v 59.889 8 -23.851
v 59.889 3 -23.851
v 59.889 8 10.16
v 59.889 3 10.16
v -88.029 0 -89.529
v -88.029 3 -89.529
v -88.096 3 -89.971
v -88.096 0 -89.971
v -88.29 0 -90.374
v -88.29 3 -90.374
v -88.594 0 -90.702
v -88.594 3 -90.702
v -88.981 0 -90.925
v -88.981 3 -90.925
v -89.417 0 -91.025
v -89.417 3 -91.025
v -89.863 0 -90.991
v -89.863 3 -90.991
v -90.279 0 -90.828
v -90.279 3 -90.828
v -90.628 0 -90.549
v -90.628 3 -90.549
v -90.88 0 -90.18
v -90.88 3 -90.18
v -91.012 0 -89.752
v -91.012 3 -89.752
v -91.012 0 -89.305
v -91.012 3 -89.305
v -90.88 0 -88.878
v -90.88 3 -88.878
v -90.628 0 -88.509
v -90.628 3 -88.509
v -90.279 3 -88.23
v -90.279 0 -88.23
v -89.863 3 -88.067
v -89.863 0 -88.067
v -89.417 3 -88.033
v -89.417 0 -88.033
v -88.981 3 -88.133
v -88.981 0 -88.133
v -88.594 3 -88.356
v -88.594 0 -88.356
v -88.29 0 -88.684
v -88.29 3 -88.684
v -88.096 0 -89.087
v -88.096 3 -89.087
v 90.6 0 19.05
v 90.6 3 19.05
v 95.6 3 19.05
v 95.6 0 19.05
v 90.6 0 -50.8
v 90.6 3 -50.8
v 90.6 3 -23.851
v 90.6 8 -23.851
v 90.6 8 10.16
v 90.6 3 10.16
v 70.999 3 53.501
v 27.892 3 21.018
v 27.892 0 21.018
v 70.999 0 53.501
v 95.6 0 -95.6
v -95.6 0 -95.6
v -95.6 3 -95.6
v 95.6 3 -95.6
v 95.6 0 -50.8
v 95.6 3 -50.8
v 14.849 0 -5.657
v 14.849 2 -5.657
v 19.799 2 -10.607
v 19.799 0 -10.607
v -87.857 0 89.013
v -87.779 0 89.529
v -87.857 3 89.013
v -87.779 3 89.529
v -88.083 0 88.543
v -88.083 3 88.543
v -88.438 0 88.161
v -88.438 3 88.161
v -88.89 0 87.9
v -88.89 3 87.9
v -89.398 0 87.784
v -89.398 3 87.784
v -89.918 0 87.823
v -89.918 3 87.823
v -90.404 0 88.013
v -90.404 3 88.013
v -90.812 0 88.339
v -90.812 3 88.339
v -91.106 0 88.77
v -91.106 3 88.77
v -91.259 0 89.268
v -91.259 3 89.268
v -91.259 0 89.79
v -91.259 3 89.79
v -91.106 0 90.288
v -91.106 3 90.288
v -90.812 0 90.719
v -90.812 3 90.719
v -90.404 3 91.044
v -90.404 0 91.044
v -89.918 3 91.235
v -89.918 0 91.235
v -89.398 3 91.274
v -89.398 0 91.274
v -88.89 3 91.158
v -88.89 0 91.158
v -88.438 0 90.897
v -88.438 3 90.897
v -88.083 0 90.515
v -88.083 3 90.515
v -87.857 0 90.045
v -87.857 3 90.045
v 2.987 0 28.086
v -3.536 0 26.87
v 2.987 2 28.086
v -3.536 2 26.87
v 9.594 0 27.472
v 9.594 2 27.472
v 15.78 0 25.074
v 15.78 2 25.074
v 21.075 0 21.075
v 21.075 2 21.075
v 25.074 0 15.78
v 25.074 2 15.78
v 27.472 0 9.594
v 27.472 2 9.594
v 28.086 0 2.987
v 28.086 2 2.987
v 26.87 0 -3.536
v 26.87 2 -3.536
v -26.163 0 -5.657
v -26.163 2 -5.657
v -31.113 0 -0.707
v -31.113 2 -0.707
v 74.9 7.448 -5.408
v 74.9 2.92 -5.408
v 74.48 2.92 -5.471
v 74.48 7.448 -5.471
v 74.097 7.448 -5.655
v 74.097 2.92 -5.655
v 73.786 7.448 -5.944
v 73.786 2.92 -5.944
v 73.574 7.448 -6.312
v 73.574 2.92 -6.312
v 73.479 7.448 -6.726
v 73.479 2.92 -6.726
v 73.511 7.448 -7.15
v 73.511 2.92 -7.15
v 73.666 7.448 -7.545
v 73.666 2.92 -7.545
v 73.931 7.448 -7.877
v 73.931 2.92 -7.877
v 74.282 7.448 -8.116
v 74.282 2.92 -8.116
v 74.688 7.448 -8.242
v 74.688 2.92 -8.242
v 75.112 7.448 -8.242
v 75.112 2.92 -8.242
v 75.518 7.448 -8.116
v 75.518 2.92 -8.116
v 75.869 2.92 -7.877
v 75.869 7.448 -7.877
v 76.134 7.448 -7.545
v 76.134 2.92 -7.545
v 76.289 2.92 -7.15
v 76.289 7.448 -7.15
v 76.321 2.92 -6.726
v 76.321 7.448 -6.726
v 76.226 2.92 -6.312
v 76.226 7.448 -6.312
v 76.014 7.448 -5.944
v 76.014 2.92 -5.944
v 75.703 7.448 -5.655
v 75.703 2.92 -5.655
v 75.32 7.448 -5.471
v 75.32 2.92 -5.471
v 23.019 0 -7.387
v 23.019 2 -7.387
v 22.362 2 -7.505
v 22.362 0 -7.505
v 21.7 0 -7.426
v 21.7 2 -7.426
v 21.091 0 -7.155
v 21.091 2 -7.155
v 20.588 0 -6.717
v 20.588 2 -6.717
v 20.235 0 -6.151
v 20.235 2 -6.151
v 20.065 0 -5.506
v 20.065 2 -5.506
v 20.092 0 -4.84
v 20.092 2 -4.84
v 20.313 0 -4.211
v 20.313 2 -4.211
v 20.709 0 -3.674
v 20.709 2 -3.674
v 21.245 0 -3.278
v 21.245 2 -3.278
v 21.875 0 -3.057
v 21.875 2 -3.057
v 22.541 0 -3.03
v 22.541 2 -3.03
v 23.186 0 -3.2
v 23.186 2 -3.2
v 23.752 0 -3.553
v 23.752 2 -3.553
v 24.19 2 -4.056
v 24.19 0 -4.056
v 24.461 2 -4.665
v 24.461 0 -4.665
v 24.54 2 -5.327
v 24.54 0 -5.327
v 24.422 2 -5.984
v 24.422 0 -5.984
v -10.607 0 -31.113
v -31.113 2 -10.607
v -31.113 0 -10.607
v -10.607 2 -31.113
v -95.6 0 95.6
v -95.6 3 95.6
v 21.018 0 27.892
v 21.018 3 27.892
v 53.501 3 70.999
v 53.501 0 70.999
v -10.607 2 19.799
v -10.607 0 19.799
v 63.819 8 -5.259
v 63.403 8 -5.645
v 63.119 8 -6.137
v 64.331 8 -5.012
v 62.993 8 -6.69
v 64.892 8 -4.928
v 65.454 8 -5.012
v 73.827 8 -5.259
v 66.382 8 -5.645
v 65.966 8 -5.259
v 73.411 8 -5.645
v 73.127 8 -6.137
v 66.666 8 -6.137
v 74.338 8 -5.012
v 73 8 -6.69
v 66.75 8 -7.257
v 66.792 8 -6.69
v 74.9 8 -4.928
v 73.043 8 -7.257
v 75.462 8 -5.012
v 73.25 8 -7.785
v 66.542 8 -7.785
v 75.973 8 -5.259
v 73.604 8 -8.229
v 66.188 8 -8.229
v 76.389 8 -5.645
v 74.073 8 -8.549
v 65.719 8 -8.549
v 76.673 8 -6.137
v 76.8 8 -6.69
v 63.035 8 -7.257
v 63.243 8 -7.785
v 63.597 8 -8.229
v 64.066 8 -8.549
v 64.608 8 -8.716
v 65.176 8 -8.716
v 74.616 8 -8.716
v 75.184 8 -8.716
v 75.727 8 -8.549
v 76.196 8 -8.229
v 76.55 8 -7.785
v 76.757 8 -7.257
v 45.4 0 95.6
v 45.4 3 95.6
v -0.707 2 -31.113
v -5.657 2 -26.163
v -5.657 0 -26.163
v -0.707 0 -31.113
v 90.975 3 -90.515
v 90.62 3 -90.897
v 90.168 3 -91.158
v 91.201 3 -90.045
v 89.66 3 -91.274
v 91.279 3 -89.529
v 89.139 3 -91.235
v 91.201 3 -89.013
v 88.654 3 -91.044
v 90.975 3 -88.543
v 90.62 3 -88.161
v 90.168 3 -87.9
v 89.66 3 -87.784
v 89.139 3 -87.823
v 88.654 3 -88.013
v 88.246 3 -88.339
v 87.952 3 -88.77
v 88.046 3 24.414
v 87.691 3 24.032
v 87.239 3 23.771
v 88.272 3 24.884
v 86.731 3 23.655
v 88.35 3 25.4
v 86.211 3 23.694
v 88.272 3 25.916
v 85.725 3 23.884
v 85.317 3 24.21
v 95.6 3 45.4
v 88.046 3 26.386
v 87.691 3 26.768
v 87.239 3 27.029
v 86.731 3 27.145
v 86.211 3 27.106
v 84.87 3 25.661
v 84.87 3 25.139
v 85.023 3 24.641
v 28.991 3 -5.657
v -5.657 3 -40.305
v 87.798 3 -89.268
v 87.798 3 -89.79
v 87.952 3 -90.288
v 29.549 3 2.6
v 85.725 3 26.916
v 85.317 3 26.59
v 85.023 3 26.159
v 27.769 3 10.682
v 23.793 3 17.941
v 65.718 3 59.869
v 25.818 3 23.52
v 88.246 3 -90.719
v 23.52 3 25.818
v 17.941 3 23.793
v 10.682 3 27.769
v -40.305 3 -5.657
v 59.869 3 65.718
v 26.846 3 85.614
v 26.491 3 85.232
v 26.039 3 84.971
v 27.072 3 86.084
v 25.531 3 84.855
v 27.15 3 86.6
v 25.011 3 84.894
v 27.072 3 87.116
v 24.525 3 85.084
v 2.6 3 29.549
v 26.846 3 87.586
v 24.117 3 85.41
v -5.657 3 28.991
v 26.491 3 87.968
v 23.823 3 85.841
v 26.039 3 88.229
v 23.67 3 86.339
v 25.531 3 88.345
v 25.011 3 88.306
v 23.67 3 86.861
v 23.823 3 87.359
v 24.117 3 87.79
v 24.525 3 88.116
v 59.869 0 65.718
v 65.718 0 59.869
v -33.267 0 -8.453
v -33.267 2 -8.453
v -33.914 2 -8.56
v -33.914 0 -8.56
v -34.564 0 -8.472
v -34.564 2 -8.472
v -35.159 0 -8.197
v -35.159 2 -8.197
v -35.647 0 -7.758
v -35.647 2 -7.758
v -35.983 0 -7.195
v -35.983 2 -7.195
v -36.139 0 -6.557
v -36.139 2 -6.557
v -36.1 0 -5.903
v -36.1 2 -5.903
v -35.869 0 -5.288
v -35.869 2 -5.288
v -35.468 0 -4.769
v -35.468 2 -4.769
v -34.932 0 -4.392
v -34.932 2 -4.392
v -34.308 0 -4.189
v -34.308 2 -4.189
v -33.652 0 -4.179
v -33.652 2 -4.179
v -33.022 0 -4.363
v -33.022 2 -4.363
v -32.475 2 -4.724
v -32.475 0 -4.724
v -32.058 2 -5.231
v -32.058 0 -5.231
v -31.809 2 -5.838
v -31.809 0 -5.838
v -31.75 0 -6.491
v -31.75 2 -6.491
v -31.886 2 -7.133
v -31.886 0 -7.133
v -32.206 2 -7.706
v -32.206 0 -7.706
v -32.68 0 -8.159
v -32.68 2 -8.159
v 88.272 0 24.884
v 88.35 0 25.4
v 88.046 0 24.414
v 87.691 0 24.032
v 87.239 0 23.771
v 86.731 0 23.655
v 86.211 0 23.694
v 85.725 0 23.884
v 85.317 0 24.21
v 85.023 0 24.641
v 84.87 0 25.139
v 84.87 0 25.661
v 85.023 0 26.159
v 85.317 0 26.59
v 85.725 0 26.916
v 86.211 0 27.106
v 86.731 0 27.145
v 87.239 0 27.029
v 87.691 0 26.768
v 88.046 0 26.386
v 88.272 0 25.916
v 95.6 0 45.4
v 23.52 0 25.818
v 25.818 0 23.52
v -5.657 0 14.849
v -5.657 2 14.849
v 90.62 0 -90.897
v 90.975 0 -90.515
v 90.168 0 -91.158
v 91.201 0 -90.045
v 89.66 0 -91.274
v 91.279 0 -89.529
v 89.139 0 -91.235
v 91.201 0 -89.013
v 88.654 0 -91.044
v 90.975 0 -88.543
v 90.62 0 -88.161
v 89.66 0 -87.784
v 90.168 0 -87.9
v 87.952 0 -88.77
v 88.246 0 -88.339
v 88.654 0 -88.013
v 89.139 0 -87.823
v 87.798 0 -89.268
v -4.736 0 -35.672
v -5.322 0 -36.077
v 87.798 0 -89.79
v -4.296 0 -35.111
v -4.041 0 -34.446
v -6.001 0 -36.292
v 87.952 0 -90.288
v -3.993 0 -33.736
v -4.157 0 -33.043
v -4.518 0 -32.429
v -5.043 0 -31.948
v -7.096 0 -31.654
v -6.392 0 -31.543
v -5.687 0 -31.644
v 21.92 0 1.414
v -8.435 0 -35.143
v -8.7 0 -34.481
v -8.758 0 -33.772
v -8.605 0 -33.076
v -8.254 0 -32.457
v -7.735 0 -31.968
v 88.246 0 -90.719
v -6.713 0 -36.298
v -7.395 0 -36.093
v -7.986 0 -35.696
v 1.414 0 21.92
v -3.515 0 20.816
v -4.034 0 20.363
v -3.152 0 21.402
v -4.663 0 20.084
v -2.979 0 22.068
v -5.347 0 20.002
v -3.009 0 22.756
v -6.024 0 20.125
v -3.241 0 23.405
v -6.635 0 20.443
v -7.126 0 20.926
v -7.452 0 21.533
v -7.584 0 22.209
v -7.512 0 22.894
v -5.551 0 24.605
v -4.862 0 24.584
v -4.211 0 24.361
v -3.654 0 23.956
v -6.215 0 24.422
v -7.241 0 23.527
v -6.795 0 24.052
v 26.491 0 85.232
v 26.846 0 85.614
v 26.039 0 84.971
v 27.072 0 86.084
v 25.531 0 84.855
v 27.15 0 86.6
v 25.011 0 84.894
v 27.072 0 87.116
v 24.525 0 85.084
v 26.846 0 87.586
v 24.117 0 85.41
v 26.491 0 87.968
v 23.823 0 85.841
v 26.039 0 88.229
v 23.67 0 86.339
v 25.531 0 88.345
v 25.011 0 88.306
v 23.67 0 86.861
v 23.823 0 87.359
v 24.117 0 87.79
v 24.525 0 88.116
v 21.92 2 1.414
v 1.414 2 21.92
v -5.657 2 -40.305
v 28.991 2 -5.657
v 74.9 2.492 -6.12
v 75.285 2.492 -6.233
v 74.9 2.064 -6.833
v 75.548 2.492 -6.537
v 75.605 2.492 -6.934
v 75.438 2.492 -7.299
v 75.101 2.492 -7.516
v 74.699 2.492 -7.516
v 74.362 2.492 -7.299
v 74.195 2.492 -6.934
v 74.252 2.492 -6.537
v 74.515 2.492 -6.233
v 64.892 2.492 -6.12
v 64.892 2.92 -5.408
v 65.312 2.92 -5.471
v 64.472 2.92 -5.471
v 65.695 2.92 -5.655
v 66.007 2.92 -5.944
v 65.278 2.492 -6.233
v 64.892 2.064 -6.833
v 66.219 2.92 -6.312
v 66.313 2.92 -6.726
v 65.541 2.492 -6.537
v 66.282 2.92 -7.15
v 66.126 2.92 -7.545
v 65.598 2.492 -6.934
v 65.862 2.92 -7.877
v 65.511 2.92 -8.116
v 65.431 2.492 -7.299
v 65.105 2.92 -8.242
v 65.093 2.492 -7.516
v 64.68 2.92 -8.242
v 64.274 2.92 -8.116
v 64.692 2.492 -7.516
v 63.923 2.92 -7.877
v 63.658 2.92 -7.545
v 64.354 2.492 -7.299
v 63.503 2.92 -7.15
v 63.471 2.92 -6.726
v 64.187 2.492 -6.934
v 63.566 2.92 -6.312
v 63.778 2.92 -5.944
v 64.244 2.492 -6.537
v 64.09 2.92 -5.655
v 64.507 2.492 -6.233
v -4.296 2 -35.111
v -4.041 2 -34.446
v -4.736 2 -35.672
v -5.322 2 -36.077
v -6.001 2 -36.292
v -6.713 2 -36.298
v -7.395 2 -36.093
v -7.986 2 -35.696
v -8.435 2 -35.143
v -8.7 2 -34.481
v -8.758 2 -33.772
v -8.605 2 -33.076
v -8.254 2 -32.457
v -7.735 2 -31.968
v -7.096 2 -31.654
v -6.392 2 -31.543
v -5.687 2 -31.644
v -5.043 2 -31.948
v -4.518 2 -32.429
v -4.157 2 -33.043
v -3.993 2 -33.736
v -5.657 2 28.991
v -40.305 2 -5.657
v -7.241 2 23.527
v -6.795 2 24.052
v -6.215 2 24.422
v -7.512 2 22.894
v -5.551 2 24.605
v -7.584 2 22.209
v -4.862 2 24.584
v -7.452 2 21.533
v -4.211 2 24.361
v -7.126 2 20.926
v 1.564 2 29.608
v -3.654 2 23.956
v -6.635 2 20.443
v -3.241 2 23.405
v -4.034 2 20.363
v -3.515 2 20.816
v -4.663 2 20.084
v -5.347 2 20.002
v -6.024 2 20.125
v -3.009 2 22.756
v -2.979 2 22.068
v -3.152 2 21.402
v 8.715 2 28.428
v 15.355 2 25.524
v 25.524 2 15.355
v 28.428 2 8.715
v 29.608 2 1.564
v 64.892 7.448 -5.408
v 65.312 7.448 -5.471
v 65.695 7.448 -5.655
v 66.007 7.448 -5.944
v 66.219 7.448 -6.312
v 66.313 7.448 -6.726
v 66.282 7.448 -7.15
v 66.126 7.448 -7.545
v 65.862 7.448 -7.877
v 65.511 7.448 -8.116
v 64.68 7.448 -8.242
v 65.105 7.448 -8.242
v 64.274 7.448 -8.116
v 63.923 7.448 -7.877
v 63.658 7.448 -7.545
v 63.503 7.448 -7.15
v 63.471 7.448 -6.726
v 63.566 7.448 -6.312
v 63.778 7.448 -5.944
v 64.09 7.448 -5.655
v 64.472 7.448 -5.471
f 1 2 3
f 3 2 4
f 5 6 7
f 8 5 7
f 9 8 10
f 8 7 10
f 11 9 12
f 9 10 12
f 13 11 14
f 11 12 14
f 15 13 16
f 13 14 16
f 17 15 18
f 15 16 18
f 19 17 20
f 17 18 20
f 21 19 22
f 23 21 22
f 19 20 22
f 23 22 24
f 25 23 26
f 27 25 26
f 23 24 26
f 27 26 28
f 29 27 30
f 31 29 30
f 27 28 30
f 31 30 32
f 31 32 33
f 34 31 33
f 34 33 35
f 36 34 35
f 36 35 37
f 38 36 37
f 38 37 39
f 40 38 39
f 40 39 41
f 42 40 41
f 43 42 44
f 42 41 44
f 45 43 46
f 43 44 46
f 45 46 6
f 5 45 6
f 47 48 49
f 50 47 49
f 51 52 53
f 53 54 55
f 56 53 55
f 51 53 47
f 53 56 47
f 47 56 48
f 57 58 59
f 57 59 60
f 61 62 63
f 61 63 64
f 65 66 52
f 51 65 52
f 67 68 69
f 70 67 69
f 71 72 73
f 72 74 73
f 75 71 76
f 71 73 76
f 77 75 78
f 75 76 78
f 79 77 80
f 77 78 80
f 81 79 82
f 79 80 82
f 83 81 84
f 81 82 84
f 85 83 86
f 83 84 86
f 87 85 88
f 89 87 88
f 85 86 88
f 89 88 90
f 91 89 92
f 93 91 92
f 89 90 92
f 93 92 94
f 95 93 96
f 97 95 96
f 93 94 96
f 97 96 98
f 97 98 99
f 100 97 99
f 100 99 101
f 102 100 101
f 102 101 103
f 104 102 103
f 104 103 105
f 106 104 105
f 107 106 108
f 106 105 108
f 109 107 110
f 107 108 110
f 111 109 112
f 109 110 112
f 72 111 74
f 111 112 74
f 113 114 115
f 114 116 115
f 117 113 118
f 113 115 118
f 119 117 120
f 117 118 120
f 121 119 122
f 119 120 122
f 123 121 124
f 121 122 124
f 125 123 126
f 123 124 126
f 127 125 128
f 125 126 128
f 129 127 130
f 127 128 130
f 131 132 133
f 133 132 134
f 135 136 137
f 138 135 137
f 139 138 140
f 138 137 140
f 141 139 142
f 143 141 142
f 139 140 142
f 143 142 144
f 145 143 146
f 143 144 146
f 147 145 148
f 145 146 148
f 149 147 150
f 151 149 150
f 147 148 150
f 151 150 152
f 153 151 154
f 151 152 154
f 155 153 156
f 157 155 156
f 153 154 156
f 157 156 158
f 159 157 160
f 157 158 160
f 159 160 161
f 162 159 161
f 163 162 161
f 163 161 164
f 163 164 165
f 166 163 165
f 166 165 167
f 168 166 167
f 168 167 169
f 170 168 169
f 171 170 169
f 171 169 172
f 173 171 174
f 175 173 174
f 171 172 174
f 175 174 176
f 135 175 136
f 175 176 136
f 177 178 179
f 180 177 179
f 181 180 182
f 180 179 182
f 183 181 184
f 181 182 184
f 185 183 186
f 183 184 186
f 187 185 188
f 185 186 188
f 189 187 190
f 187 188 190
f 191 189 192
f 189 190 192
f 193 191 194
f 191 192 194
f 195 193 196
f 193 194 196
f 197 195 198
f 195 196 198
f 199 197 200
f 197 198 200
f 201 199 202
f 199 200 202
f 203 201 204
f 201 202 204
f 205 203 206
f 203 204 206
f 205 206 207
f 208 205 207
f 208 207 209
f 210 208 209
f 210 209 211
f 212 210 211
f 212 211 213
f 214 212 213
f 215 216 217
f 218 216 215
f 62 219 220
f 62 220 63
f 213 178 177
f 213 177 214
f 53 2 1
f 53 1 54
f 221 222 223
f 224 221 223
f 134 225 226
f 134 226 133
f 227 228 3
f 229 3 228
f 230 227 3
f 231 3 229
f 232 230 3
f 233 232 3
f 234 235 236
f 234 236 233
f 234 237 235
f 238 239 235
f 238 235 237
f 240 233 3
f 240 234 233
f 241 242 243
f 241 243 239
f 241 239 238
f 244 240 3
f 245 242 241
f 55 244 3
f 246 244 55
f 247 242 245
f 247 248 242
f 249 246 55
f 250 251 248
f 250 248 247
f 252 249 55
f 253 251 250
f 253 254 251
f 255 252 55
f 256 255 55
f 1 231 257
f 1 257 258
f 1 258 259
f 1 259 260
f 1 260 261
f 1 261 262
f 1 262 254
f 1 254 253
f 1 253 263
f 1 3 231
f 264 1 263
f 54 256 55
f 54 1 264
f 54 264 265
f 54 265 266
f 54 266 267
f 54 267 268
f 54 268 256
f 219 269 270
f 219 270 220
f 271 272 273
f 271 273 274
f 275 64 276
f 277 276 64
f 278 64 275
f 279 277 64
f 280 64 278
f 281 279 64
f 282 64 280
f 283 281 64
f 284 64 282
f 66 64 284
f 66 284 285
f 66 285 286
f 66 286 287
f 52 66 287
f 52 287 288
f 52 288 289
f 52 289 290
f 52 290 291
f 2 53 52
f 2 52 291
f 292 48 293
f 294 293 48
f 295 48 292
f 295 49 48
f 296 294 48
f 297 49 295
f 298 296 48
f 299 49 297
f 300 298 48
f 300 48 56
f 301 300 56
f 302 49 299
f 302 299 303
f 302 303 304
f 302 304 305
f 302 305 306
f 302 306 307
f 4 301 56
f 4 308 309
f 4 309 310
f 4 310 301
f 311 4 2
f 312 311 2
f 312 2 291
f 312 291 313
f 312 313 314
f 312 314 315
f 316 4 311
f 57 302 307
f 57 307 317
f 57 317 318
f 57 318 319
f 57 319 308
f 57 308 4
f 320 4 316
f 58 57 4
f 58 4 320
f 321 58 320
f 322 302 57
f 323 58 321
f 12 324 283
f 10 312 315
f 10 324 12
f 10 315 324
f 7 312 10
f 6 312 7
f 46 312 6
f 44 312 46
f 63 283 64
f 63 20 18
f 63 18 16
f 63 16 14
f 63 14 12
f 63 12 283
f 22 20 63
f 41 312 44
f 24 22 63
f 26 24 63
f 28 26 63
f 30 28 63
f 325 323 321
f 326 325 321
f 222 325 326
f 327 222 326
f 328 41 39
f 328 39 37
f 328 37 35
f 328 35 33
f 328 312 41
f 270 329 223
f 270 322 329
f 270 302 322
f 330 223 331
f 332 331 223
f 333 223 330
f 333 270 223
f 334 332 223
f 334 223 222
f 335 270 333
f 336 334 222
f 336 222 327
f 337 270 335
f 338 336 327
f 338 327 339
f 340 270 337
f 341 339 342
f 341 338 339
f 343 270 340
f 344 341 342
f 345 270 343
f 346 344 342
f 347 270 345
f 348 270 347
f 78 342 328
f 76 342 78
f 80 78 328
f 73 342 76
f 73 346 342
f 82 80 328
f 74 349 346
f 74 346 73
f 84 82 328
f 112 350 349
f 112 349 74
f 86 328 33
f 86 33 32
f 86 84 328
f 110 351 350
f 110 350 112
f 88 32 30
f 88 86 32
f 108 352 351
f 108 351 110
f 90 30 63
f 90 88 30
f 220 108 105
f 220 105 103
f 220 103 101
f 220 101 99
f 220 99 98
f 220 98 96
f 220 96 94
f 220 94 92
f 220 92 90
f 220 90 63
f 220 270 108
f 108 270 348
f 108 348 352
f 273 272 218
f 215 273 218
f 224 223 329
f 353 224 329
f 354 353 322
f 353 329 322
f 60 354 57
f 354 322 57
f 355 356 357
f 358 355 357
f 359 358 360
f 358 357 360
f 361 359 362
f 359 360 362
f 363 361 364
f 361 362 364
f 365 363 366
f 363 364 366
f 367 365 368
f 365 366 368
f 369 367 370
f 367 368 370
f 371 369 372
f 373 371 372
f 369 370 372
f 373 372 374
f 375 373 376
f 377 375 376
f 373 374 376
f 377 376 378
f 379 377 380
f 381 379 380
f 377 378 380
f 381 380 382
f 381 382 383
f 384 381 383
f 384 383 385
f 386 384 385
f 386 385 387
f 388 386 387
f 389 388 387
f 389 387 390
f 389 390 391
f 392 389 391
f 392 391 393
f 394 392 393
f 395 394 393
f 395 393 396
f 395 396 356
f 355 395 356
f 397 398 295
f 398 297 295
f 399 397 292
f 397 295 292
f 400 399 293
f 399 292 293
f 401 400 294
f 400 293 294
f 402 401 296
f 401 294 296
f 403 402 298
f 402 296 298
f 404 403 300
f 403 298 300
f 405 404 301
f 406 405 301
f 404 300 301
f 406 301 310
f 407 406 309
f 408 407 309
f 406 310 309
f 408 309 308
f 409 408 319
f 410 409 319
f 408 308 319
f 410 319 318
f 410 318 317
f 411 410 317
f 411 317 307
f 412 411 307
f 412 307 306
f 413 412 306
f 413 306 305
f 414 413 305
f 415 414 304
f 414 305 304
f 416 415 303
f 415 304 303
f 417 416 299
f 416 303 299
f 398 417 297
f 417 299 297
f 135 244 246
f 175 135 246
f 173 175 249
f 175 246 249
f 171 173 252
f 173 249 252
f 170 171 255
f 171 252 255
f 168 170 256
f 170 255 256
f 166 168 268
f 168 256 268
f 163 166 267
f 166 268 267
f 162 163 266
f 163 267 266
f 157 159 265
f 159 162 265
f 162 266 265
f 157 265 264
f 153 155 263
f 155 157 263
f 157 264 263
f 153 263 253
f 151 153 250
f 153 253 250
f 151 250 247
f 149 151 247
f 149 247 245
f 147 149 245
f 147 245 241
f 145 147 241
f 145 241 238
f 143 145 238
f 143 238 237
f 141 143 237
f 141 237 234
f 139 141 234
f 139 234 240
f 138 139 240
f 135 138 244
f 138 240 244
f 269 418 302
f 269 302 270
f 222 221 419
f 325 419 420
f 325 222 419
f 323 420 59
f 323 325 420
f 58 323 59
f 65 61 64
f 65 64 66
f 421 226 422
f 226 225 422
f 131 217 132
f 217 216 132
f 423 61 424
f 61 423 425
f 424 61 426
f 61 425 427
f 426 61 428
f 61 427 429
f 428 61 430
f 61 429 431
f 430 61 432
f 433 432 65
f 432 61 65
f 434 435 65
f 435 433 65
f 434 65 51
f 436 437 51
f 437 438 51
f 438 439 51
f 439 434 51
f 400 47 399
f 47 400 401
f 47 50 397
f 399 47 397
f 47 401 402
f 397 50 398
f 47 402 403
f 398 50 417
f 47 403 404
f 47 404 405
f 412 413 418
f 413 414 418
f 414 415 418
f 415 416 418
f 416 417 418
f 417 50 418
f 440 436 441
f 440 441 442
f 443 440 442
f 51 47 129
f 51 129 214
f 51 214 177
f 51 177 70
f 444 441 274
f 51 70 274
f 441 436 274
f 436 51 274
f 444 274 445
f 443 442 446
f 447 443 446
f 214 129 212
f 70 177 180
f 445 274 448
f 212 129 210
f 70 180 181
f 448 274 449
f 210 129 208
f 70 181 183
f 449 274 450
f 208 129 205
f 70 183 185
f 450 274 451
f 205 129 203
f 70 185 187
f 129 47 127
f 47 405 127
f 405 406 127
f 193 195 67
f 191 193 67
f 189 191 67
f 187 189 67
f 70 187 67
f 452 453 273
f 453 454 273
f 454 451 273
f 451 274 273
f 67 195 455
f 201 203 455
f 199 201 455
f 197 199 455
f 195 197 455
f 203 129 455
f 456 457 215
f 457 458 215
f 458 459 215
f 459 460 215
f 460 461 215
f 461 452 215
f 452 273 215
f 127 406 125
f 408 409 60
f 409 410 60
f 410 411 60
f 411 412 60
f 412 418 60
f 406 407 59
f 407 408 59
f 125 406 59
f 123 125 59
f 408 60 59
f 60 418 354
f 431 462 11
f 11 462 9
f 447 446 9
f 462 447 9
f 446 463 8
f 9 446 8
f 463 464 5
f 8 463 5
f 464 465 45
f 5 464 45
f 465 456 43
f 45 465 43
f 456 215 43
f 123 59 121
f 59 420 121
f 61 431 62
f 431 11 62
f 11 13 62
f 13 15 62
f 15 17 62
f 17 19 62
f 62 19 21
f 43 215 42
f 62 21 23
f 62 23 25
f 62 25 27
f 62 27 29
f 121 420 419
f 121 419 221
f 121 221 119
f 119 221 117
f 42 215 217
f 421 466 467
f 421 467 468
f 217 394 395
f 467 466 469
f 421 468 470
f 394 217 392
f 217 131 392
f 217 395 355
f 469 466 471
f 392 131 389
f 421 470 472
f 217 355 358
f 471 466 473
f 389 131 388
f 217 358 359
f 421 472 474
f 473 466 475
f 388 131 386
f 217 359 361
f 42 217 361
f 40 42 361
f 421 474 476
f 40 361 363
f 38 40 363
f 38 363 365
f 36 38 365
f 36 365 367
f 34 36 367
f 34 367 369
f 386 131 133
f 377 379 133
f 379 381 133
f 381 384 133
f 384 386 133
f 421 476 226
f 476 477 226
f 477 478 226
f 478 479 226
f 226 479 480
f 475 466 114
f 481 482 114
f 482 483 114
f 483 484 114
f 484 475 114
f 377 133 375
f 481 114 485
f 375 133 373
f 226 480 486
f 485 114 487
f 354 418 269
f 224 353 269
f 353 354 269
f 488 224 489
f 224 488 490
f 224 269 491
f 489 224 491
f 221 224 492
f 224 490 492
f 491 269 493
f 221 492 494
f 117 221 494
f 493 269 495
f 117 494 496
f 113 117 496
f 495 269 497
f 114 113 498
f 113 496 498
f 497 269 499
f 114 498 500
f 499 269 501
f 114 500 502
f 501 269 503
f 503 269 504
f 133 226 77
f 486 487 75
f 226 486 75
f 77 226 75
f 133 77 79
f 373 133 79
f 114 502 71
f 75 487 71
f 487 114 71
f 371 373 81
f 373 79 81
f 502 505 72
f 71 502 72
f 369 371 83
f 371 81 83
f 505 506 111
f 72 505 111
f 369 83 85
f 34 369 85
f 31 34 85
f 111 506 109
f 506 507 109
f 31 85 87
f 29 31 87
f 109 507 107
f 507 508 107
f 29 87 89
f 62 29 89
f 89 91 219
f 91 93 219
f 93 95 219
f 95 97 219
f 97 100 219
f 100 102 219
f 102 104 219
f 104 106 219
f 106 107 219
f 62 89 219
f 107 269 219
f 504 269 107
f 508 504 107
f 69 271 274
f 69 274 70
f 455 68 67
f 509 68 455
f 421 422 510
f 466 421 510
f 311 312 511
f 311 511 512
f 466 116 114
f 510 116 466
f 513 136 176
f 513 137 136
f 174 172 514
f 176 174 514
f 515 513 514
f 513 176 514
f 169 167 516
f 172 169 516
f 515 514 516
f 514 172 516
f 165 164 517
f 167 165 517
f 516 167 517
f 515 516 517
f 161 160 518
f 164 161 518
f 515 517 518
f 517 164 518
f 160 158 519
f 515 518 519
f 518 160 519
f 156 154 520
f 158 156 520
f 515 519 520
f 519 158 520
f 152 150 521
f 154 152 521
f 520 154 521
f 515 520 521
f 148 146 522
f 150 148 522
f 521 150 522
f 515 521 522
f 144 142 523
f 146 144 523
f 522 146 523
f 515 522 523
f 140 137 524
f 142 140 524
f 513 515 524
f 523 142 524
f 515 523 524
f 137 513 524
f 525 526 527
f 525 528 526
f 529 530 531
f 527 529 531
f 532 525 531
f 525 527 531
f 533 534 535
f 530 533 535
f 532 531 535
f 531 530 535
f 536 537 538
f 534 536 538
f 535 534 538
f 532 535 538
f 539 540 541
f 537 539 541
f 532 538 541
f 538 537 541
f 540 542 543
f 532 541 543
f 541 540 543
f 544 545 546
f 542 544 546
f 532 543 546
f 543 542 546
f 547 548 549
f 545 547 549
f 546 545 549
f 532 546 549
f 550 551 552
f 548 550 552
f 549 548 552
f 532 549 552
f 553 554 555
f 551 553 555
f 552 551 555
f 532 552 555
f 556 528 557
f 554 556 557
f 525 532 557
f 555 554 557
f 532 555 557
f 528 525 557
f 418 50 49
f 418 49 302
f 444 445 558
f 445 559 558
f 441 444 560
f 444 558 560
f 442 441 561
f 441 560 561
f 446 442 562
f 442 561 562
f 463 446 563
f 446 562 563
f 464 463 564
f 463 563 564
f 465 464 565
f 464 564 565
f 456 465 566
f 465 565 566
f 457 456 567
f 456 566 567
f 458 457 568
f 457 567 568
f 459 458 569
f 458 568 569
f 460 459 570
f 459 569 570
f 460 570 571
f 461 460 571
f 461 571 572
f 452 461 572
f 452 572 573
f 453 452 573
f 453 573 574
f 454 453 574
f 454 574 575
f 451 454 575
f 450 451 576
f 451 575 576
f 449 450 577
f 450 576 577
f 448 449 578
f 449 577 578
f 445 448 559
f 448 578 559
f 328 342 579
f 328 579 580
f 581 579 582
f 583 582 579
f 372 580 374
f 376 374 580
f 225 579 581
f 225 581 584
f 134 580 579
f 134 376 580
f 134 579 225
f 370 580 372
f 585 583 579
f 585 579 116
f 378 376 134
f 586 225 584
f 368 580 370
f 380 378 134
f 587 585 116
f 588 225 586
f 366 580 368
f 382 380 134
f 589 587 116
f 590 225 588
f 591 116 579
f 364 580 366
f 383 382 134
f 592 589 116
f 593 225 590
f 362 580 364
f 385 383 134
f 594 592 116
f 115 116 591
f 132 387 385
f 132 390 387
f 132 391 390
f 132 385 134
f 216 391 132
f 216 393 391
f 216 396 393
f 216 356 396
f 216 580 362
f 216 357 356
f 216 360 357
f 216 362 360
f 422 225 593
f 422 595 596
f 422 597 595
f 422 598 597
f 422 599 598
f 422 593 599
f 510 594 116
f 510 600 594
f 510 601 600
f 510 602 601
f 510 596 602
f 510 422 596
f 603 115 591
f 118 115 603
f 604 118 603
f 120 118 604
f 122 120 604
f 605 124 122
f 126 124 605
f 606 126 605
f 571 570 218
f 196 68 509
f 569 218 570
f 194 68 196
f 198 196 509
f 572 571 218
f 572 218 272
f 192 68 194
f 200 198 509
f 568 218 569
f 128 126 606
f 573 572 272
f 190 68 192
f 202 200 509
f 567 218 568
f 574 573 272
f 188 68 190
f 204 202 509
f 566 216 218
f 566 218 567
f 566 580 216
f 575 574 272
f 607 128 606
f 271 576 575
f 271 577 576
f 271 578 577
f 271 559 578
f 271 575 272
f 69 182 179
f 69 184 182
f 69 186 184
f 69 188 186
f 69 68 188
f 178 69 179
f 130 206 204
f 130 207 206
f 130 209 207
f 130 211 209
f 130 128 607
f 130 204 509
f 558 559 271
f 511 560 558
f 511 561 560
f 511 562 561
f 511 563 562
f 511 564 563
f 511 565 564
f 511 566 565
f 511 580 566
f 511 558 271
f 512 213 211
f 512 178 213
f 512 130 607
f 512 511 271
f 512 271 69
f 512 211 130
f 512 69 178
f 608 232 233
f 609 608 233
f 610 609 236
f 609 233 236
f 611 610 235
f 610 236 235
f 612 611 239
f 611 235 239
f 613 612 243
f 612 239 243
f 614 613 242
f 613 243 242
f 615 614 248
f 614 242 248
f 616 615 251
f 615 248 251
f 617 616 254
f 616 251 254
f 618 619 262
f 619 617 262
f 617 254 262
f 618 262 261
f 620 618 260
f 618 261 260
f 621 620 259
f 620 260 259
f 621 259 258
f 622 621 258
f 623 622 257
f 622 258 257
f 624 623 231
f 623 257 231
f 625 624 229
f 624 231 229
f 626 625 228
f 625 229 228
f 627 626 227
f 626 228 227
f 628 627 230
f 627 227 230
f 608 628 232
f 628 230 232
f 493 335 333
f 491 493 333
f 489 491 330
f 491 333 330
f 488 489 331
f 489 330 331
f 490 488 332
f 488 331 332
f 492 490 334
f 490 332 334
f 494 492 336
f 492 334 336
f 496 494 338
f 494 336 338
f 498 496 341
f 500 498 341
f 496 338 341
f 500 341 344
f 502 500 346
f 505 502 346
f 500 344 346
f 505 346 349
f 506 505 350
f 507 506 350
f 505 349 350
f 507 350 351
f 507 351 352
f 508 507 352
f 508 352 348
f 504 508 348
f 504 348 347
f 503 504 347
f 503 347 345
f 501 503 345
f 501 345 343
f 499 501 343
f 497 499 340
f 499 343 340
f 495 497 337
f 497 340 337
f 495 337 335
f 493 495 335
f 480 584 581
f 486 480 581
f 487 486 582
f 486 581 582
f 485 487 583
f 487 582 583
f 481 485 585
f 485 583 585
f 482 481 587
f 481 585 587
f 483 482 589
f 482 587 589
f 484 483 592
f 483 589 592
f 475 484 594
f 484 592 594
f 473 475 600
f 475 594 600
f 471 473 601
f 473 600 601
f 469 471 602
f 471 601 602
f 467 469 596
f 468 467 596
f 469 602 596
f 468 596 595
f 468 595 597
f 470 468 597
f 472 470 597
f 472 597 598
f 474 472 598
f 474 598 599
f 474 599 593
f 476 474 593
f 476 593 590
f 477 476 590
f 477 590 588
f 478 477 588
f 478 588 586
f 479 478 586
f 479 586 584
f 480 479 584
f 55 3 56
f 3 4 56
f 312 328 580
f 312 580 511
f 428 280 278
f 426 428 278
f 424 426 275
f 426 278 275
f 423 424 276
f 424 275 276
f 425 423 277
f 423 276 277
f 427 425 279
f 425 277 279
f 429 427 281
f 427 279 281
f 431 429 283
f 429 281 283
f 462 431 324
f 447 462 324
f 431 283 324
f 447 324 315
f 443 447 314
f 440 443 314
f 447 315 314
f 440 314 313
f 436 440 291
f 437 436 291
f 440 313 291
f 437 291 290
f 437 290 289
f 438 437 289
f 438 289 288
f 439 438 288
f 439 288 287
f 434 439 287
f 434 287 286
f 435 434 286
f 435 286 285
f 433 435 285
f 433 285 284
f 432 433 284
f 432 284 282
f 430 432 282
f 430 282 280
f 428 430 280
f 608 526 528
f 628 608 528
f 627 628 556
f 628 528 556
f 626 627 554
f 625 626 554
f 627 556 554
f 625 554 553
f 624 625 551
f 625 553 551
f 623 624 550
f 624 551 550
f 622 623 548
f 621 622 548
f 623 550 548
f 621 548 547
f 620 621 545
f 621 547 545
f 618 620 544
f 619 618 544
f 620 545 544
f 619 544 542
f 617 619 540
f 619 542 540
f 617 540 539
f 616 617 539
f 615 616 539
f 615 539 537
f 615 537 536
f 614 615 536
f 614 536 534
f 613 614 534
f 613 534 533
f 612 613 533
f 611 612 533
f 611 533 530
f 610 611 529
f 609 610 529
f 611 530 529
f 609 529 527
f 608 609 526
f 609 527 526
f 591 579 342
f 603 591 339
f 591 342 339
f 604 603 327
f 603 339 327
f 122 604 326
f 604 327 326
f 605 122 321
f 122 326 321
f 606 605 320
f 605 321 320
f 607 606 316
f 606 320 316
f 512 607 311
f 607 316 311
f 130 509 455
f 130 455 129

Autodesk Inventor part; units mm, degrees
ref_plane "YZ Plane" through (0, 0, 0) normal (1, 0, 0) x (0, 1, 0)
ref_plane "XZ Plane" through (0, 0, 0) normal (0, 1, 0) x (-1, 0, 0)
ref_plane "XY Plane" through (0, 0, 0) normal (0, 0, 1) x (1, 0, 0)
sketch "Sketch1" plane through (0, 0, 0) normal (0, 1, 0) x (-1, 0, 0)
  line L0 (101.6, -101.6) -> (-101.6, -101.6)
  line L1 (-101.6, -101.6) -> (-101.6, 101.6)
  line L2 (-101.6, 101.6) -> (101.6, 101.6)
  line L3 (101.6, 101.6) -> (101.6, -101.6)
  line L4 (96.6, -96.6) -> (-96.6, -96.6)
  line L5 (-96.6, -96.6) -> (-96.6, 96.6)
  line L6 (-96.6, 96.6) -> (96.6, 96.6)
  line L7 (96.6, 96.6) -> (96.6, -96.6)
  line L8 (101.6, 101.6) -> (-40.4, 101.6)
  circle A0 centre (0, 0) radius 88.9
  line L9 (-40.4, 101.6) -> (-101.6, 40.4)
  line L10 (-45.4, 101.6) -> (-101.6, 45.4)
  line L11 (96.6, 96.6) -> (96.6, 101.6)
  line L12 (-45.4, 101.6) -> (-35.4, 101.6)
  line L13 (-35.4, 101.6) -> (-35.4, 96.6)
  line L14 (-35.4, 96.6) -> (-45.4, 96.6)
  line L15 (-45.4, 96.6) -> (-45.4, 101.6)
  line L16 (-101.6, 39.4) -> (-39.4, 101.6)
  line L17 (95.6, -95.6) -> (-95.6, -95.6)
  line L18 (-95.6, -95.6) -> (-95.6, 95.6)
  line L19 (-95.6, 95.6) -> (95.6, 95.6)
  line L20 (95.6, 95.6) -> (95.6, -95.6)
  point P0 (96.6, 51.2168)
  point P1 (101.6, 40.4)
  point P2 (101.6, -40.4)
  point P3 (96.6, -51.2168)
  point P4 (-96.6, 45.4)
  point P5 (-45.4, 96.6)
  point P6 (-45.4, 95.6)
  point P7 (-95.6, 45.4)
  dimension "d0" = 203.2
  dimension "d1" = 203.2
  dimension "d2" = 101.6
  dimension "d3" = 101.6
  dimension "d4" = 5
  dimension "d5" = 5
  dimension "d6" = 5
  dimension "d7" = 5
  dimension "d8" = 142
  dimension "d9" = 61.2
  dimension "d10" = 177.8
  dimension "d11" = 5
  dimension "d12" = 5
  dimension "d13" = 10
  dimension "d14" = 1
  dimension "d15" = 1
  dimension "d16" = 1
  dimension "d17" = 1
  dimension "d18" = 1
extrude "Extrusion1" add sketch "Sketch1" along normal blind 3 contours L16 L19 L20 L17 L18 | A0
sketch "Sketch2" plane through (0, 3, 0) normal (0, 1, 0) x (1, 0, 0)
  circle A0 centre (0, 0) radius 34.925
  circle A1 centre (0, 0) radius 88.9
  line L0 (0, 0) -> (53.5014, -70.9987)
  line L1 (0, 0) -> (70.9987, -53.5014)
  line L2 (45.4, -95.6) -> (95.6, -45.4) projected
  line L3 (70.5, -70.5) -> (0, 0)
  point P0 (21.0184, -27.8923)
  point P1 (27.8923, -21.0184)
  dimension "d21" = 69.85
  dimension "d22" = 177.8
  dimension "d23" = 8
  dimension "d24" = 8
extrude "Extrusion2" cut sketch "Sketch2" against normal blind 5 contours A0 L3 A1 L0 | L1 A1 L3 A0
sketch "Sketch3" plane through (0, 3, 0) normal (0, 1, 0) x (1, 0, 0)
  circle A0 centre (0, 0) radius 2.5
  line L0 (11.3314, 2.139) -> (-2.139, -11.3314)
  line L1 (0, 0) -> (-5.6569, 5.6569)
  line L2 (-5.6569, -14.8492) -> (-26.163, 5.6569)
  line L3 (-5.6569, 26.163) -> (14.8492, 5.6569)
  circle A1 centre (-5.6569, 5.6569) radius 14
  line L4 (-26.163, 5.6569) -> (-5.6569, 26.163)
  line L5 (14.8492, 5.6569) -> (-5.6569, -14.8492)
  line L6 (-40.3051, 5.6569) -> (-5.6569, 40.3051)
  line L7 (-5.6569, 40.3051) -> (28.9914, 5.6569)
  line L8 (28.9914, 5.6569) -> (-5.6569, -28.9914)
  line L9 (-5.6569, -28.9914) -> (-40.3051, 5.6569)
  line L10 (-22.6451, 9.1747) -> (-9.1747, 22.6451)
  line L11 (-9.1747, 22.6451) -> (-12.7668, 26.2372)
  line L12 (-12.7668, 26.2372) -> (-26.2372, 12.7668)
  line L13 (-26.2372, 12.7668) -> (-22.6451, 9.1747)
  line L14 (-36.0624, 5.6569) -> (-5.6569, 36.0624)
  line L15 (-5.6569, 36.0624) -> (26.8701, 3.5355)
  line L16 (26.8701, 3.5355) -> (-3.5355, -26.8701)
  line L17 (-3.5355, -26.8701) -> (-36.0624, 5.6569)
  arc A2 (-5.6569, -28.9914) -> (28.9914, 5.6569) centre (0.4206, -0.4206) ccw
  dimension "d27" = 8
  dimension "d28" = 28
  dimension "d29" = 29
  dimension "d30" = 29
  dimension "d31" = 14.5
  dimension "d32" = 10
  dimension "d33" = 10
  dimension "d34" = 10
  dimension "d35" = 10
  dimension "d36" = 5.08
  dimension "d37" = 9.525
  dimension "d38" = 9.525
  dimension "d39" = 3
  dimension "d40" = 3
  dimension "d41" = 0
  dimension "d42" = 3
  dimension "d51" = 29.21
extrude "Extrusion3" cut sketch "Sketch3" against normal blind 1 contours A0 | L0 L5 L2 L4 L3 | L4 L13 L12 L11 | A1 | L6 L7 L8 L15 L14 L17 L9 | L8 A2 | L17 L14 L15 L8
sketch "Sketch4" plane through (0, 2, 0) normal (0, 1, 0) x (1, 0, 0)
  line L0 (-36.0624, 5.6569) -> (-5.6569, 36.0624)
  line L1 (-5.6569, 36.0624) -> (26.8701, 3.5355)
  line L2 (26.8701, 3.5355) -> (-3.5355, -26.8701)
  line L3 (-3.5355, -26.8701) -> (-36.0624, 5.6569)
  line L4 (-5.6569, 40.3051) -> (28.9914, 5.6569) projected
  line L5 (-40.3051, 5.6569) -> (-5.6569, 40.3051) projected
  line L6 (-5.6569, -28.9914) -> (-40.3051, 5.6569) projected
  line L7 (28.9914, 5.6569) -> (-5.6569, -28.9914) projected
  arc A0 (-3.5355, -26.8701) -> (26.8701, 3.5355) centre (4.0877, -4.0877) ccw
  point P0 (0, 0)
  dimension "d45" = 3
  dimension "d46" = 3
  dimension "d47" = 3
  dimension "d48" = 0
extrude "Extrusion4" cut sketch "Sketch4" against normal blind 5 contours L0 L1 L2 L3 | L2 A0
sketch "Sketch6" plane through (0, 3, 0) normal (0, 1, 0) x (1, 0, 0)
  line L0 (95.6, 95.6) -> (-95.6, 95.6) projected
  line L1 (95.6, 95.6) -> (90.6, 95.6)
  line L2 (90.6, 95.6) -> (90.6, -46.4)
  line L3 (90.6, -46.4) -> (95.6, -46.4)
  line L4 (95.6, -46.4) -> (95.6, 95.6)
  line L5 (95.6, -45.4) -> (95.6, 95.6) projected
  line L6 (90.6, -19.05) -> (95.6, -19.05)
  line L7 (95.6, -19.05) -> (95.6, 50.8)
  line L8 (95.6, 50.8) -> (90.6, 50.8)
  line L9 (90.6, 50.8) -> (90.6, -19.05)
  line L10 (0, 0) -> (95.6, 0)
  point P0 (95.6, -19.05)
  dimension "d58" = 5
  dimension "d59" = 142
  dimension "d62" = 50.8
  dimension "d63" = 19.05
extrude "Extrusion6" cut sketch "Sketch6" against normal blind 25.4 contours L4 L10 L2 L8 | L4 L6 L2 L10
sketch "Sketch7" plane through (0, 3, 0) normal (0, 1, 0) x (1, 0, 0)
  line L0 (-95.6, 95.6) -> (-95.6, -95.6) projected
  line L1 (-95.6, -95.6) -> (45.4, -95.6) projected
  line L2 (95.6, 50.8) -> (90.6, 50.8) projected
  line L3 (90.6, 50.8) -> (65.2, 50.8)
  line L4 (90.6, -19.05) -> (90.6, 50.8)
  line L5 (90.6, -19.05) -> (90.6, 50.8) projected
  line L6 (90.6, 50.8) -> (95.6, 50.8) projected
  line L7 (90.6, 50.8) -> (59.8886, 50.8)
  line L8 (59.8886, 50.8) -> (59.8886, -10.16)
  line L9 (59.8886, -10.16) -> (90.6, -10.16)
  line L10 (90.6, -10.16) -> (90.6, 50.8)
  line L11 (59.8886, 23.8506) -> (90.6, 23.8506)
  point P0 (0, 0)
  point P1 (62.2, 50.8)
  dimension "d72" = 60.96
  dimension "d90" = 34.0106
  dimension "d154" = 30.7114
extrude "Extrusion7" add sketch "Sketch7" along normal blind 5 contours L4 L9 L8 L11
sketch "Sketch8" plane through (0, 8, 0) normal (0, 1, 0) x (1, 0, 0)
  line L0 (59.8886, -10.16) -> (90.6, -10.16) projected
  line L1 (59.8886, -10.16) -> (90.6, -10.16)
  line L2 (90.6, -10.16) -> (90.6, 6.8326)
  line L3 (90.6, 50.8) -> (90.6, -19.05) projected
  line L4 (90.6, 6.8326) -> (65.2, 6.8326)
  circle A0 centre (74.9, 6.8326) radius 1.5
  circle A1 centre (64.8924, 6.8326) radius 1.5
  line L5 (59.8886, 23.8506) -> (59.8886, -10.16) projected
  point P0 (0, 0)
  dimension "d78" = 16.9926
  dimension "d79" = 3
  dimension "d80" = 3
  dimension "d139" = 5.0038
  dimension "d140" = 10.0076
  dimension "d153" = 15.7
hole "Hole1" at (74.9, 8, -6.8326) at (64.8924, 8, -6.8326) direction (0, -1, 0) diameter 2.85 depth 5.08 tip angle 118 countersink diameter 3.81 countersink angle 82 thread size "M3.5x0.6" class "6H" standard "ANSI Metric M Profile"
sketch "Sketch9" plane through (0, 2, 0) normal (0, 1, 0) x (1, 0, 0)
  point P0 (0, 0)
sketch "Sketch10" plane through (0, 2, 0) normal (0, 1, 0) x (1, 0, 0)
  circle A0 centre (6.7129, 18.0166) radius 2
  circle A1 centre (-18.0312, -6.7275) radius 2
  circle A2 centre (-18.0312, -6.7275) radius 2
  circle A3 centre (-5.6569, 5.6469) radius 14
  circle A4 centre (0, -0.01) radius 2.5
  circle A5 centre (22.2964, 5.2615) radius 2.2448
  circle A6 centre (-5.2761, -22.3111) radius 2.3104
  circle A7 centre (-33.9469, 6.3598) radius 2.2008
  circle A8 centre (-6.3744, 33.9323) radius 2.3894
  line L0 (-5.6569, 40.3051) -> (28.9914, 5.6569) projected
  line L1 (-5.6569, 40.3051) -> (1.4142, 33.234)
  line L2 (-5.6569, 26.163) -> (1.4142, 33.234)
  line L3 (-5.6569, 26.163) -> (-12.7279, 33.234)
  line L4 (-40.3051, 5.6569) -> (-5.6569, 40.3051) projected
  line L5 (-5.6569, 40.3051) -> (-40.3051, 5.6569)
  line L6 (-5.6569, 26.163) -> (-33.234, -1.4142)
  line L7 (-5.6569, -28.9914) -> (-40.3051, 5.6569) projected
  line L8 (-33.234, 12.7279) -> (-26.163, 5.6569)
  arc A9 (-5.6569, -28.9914) -> (21.0752, -21.0752) centre (0.4206, -0.4206) ccw projected
  line L9 (-5.6569, -28.9914) -> (28.9914, 5.6569)
  line L10 (-5.6569, 36.0624) -> (26.8701, 3.5355) projected
  line L11 (-12.7279, -21.9203) -> (21.9203, 12.7279)
  line L12 (-5.6569, -14.8492) -> (1.4142, -21.9203)
  line L13 (14.8492, 5.6569) -> (21.9203, -1.4142)
  point P0 (0, 0)
  point P1 (0.0071, -0.017)
  point P2 (24.4219, 5.9837)
  point P3 (23.0187, 7.3869)
  point P4 (19.799, 10.6066)
  dimension "d91" = 34.9934
  dimension "d92" = 28
  dimension "d93" = 8
  dimension "d94" = 10
  dimension "d95" = 10
  dimension "d96" = 10
  dimension "d97" = 10
  dimension "d98" = 10
extrude "Extrusion8" add sketch "Sketch10" against normal up to surface (2 mm away) contours A5 L10 L9 L13 L11 | L2 L3 L4 L0 | L9 L7 L11 L12 | L6 L7 L4 L8
sketch "Sketch11" plane through (0, 3, 0) normal (0, 1, 0) x (1, 0, 0)
  circle A0 centre (6.7129, 18.0166) radius 2
  circle A1 centre (-18.0312, -6.7275) radius 2
  circle A2 centre (-18.0312, -6.7275) radius 2
  circle A3 centre (-5.6569, 5.6469) radius 14
  circle A4 centre (0, -0.01) radius 2.5
  circle A5 centre (22.2964, 5.2615) radius 2.2448
  circle A6 centre (-5.2761, -22.3111) radius 2.3104
  circle A7 centre (-33.9469, 6.3598) radius 2.2008
  circle A8 centre (-6.3744, 33.9323) radius 2.3894
  line L0 (-5.6569, 40.3051) -> (28.9914, 5.6569)
  line L1 (-5.6569, 40.3051) -> (1.4142, 33.234)
  line L2 (-5.6569, 26.163) -> (1.4142, 33.234)
  line L3 (-5.6569, 26.163) -> (-12.7279, 33.234)
  line L4 (-40.3051, 5.6569) -> (-5.6569, 40.3051)
  line L5 (-5.6569, 40.3051) -> (-40.3051, 5.6569)
  line L6 (-5.6569, 26.163) -> (-33.234, -1.4142)
  line L7 (-5.6569, -28.9914) -> (-40.3051, 5.6569)
  line L8 (-33.234, 12.7279) -> (-26.163, 5.6569)
  arc A9 (-5.6569, -28.9914) -> (21.0752, -21.0752) centre (0.4206, -0.4206) ccw
  line L9 (-5.6569, -28.9914) -> (28.9914, 5.6569)
  line L10 (-5.6569, 36.0624) -> (26.8701, 3.5355)
  line L11 (-12.7279, -21.9203) -> (21.9203, 12.7279)
  line L12 (-5.6569, -14.8492) -> (1.4142, -21.9203)
  line L13 (14.8492, 5.6569) -> (21.9203, -1.4142)
  point P0 (0, 0)
  point P1 (0, 0)
  point P2 (0.0071, -0.017)
  point P3 (24.4219, 5.9837)
  point P4 (23.0187, 7.3869)
  point P5 (19.799, 10.6066)
  point P6 (24.4219, 5.9837)
  point P7 (23.0187, 7.3869)
  dimension "d101" = 34.9934
  dimension "d102" = 28
  dimension "d103" = 8
  dimension "d104" = 10
  dimension "d105" = 10
  dimension "d106" = 10
  dimension "d107" = 10
  dimension "d108" = 10
extrude "Extrusion9" cut sketch "Sketch11" against normal blind 10 contours A5 L10 | A6 | A7 | A8 picked at (21.4653, 4.9881)
sketch "Sketch12" plane through (0, 3, 0) normal (0, 1, 0) x (1, 0, 0)
  line L0 (95.6, 50.8) -> (95.6, 95.6) projected
  line L1 (-95.6, -95.6) -> (45.4, -95.6) projected
  line L2 (95.6, 95.6) -> (-95.6, -95.6)
  line L3 (95.6, 95.6) -> (-95.6, 95.6) projected
  line L4 (0, 95.6) -> (0, -95.6)
  line L5 (-95.6, -95.6) -> (45.4, -95.6) projected
  point P0 (0, 0)
ref_plane "Work Plane2" through (0, 3, -95.6) normal (-1, 0, 0) x (0, 0, 1)
sketch "Sketch15" plane through (0, 3, 0) normal (0, 1, 0) x (1, 0, 0)
  line L0 (-96.6, 96.6) -> (-96.6, -96.6)
  line L1 (96.6, 96.6) -> (-96.6, 96.6)
  line L2 (-96.6, 96.6) -> (96.6, 96.6)
  line L3 (96.6, -45.4) -> (45.4, -96.6)
  line L4 (96.6, 96.6) -> (96.6, -45.4)
  line L5 (96.6, -45.4) -> (45.4, -96.6)
  line L6 (45.4, -96.6) -> (-96.6, -96.6)
  line L7 (-96.6, -96.6) -> (-96.6, 96.6)
  line L8 (-96.6, 96.6) -> (-89.5289, 89.5289)
  circle A0 centre (-89.5289, 89.5289) radius 5
  circle A1 centre (-89.5289, 89.5289) radius 1.5
  line L9 (-89.5289, 84.5289) -> (-96.6, 84.5289)
  line L10 (-89.5289, 89.5289) -> (-89.5289, 84.5289)
  line L11 (-89.5289, 89.5289) -> (-84.5289, 89.5289)
  line L12 (-84.5289, 96.6) -> (-84.5289, 89.5289)
  line L13 (-96.6, -96.6) -> (-89.5289, -89.5289)
  line L14 (-96.6, -96.6) -> (-86.6, -96.6) construction
  circle A2 centre (-89.5289, -89.5289) radius 5
  circle A3 centre (-89.5289, -89.5289) radius 1.75
  line L15 (-89.5289, -89.5289) -> (-84.5289, -89.5289)
  line L16 (-84.5289, -96.6) -> (-84.5289, -89.5289)
  line L17 (-89.5289, -89.5289) -> (-89.5289, -84.5289)
  line L18 (-96.6, -84.5289) -> (-89.5289, -84.5289)
  line L19 (96.6, 96.6) -> (89.5289, 89.5289)
  circle A4 centre (89.5289, 89.5289) radius 5
  circle A5 centre (89.5289, 89.5289) radius 1.75
  line L20 (89.5289, 89.5289) -> (84.5289, 89.5289)
  line L21 (84.5289, 96.6) -> (84.5289, 89.5289)
  line L22 (89.5289, 89.5289) -> (89.5289, 84.5289)
  line L23 (96.6, 84.5289) -> (89.5289, 84.5289)
  line L24 (96.6, -43.114) -> (96.6, 96.6)
  line L25 (-96.6, -96.6) -> (43.1178, -96.6)
  line L26 (28.9914, 5.6569) -> (-5.6569, -28.9914)
  line L27 (25.4, -25.4) -> (101.6, -25.4)
  line L28 (101.6, -88.9) -> (101.6, 101.6)
  line L29 (25.4, -25.4) -> (25.4, -101.6)
  line L30 (43.1178, -101.6) -> (-101.6, -101.6)
  line L31 (96.6, -25.4) -> (86.6, -25.4)
  circle A6 centre (86.6, -25.4) radius 5
  circle A7 centre (86.6, -25.4) radius 1.75
  line L32 (25.4, -96.6) -> (25.4, -86.6)
  circle A8 centre (25.4, -86.6) radius 5
  circle A9 centre (25.4, -86.6) radius 1.75
  point P0 (0, 0)
  point P1 (0, 0)
  dimension "d117" = 10
  dimension "d118" = 3
  dimension "d119" = 10
  dimension "d120" = 45
  dimension "d121" = 10
  dimension "d122" = 3.5
  dimension "d123" = 10
  dimension "d124" = 10
  dimension "d125" = 3.5
  dimension "d126" = 76.2
  dimension "d127" = 76.2
  dimension "d128" = 10
  dimension "d129" = 10
  dimension "d130" = 3.5
  dimension "d131" = 10
  dimension "d132" = 10
  dimension "d133" = 3.5
extrude "Extrusion12" cut sketch "Sketch15" against normal blind 25.4 contours A1 L11 L8 | L8 L10 A1 | L10 L11 A1 | L17 L13 A3 | A3 L15 L17 | L20 L22 A5 | A5 L19 L20 | L13 L15 A3 | A5 L22 L19 | A9 L29 | L29 A9 | A7 L27 | L27 A7
ref_plane "Work Plane3" through (0, 3, -95.6) normal (-0.7071068, -0.7071068, 0) x (0, 0, 1)
equation "\"d1\" = d0"
equation "\"d2\" = 0.5 * d0"
equation "\"d3\" = 0.5 * d0"
properties part number "Drop_Plate"
